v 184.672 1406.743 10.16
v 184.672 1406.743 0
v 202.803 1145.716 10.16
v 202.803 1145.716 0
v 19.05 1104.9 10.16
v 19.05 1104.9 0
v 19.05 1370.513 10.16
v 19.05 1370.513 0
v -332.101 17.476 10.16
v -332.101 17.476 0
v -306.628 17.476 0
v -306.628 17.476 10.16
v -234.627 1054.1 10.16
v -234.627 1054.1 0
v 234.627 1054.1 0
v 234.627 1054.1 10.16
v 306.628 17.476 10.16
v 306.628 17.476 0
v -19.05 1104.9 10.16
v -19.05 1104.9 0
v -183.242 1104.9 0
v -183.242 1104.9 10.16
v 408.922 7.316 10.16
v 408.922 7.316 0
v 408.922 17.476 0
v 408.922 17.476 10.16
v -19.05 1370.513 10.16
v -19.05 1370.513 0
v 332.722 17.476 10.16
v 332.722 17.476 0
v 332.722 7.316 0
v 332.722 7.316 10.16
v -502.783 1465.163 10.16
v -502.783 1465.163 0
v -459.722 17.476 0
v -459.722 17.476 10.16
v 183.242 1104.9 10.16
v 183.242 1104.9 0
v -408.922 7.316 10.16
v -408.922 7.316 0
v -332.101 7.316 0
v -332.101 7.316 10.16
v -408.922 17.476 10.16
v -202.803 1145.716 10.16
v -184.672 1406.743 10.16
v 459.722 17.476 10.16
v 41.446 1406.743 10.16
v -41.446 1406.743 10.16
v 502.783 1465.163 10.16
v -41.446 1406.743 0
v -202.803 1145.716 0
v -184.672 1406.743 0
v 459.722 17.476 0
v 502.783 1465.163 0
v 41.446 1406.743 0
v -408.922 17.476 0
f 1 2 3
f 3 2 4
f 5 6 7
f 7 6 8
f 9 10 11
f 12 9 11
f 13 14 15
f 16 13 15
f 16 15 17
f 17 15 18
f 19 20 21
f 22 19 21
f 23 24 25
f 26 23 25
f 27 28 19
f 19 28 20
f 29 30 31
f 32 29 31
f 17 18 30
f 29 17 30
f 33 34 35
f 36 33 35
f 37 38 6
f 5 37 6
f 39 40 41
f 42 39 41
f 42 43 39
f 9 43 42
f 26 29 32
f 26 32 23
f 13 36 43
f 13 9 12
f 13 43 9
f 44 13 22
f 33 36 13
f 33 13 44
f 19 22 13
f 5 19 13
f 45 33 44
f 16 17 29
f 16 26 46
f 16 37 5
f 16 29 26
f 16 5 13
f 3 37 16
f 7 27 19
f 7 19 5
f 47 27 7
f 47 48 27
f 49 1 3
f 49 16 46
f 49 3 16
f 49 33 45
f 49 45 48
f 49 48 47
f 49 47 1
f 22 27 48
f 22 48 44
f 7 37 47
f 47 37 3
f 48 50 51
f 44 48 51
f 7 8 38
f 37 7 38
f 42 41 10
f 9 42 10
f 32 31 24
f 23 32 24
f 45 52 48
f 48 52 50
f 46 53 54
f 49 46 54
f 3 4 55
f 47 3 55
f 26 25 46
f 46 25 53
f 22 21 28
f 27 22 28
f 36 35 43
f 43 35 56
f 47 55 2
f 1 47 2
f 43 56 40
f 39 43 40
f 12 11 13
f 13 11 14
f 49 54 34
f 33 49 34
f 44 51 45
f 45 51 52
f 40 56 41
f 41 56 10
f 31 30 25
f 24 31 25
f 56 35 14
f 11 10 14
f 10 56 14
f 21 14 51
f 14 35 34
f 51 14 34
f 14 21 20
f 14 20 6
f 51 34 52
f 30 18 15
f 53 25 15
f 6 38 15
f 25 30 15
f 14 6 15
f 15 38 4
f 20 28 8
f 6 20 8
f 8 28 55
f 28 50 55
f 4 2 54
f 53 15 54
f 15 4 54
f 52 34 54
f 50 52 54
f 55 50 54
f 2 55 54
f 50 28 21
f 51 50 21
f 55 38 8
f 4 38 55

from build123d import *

# Parameters (mm, degrees)
BOSS_EXTRUDE1_DEPTH = 10.16


with BuildPart() as part:
    # Sketch1 → Boss-Extrude1 (new body)
    with BuildSketch(Plane.XY):
        Polygon((-502.783260533, 1465.163333881), (-459.721789204, 17.476365817), (-408.921789204, 17.476365817), (-408.921789204, 7.316365817), (-332.100796745, 7.316365817), (-332.100796745, 17.476365817), (-306.627827519, 17.476365817), (-234.627172097, 1054.1), (234.627172097, 1054.1), (306.627827519, 17.476365817), (332.721789204, 17.476365817), (332.721789204, 7.316365817), (408.921789204, 7.316365817), (408.921789204, 17.476365817), (459.721789204, 17.476365817), (502.783260533, 1465.163333881), align=None)
        Polygon((-202.80261453, 1145.716008632), (-184.672467887, 1406.743333881), (-41.445883295, 1406.743333881), align=None, mode=Mode.SUBTRACT)
        Polygon((-19.05, 1104.9), (-183.241684323, 1104.9), (-19.05, 1370.513438368), align=None, mode=Mode.SUBTRACT)
        Polygon((183.241684323, 1104.9), (19.05, 1104.9), (19.05, 1370.513438368), align=None, mode=Mode.SUBTRACT)
        Polygon((184.672467887, 1406.743333881), (202.80261453, 1145.716008632), (41.445883295, 1406.743333881), align=None, mode=Mode.SUBTRACT)
    extrude(amount=BOSS_EXTRUDE1_DEPTH)


solid = part.part
